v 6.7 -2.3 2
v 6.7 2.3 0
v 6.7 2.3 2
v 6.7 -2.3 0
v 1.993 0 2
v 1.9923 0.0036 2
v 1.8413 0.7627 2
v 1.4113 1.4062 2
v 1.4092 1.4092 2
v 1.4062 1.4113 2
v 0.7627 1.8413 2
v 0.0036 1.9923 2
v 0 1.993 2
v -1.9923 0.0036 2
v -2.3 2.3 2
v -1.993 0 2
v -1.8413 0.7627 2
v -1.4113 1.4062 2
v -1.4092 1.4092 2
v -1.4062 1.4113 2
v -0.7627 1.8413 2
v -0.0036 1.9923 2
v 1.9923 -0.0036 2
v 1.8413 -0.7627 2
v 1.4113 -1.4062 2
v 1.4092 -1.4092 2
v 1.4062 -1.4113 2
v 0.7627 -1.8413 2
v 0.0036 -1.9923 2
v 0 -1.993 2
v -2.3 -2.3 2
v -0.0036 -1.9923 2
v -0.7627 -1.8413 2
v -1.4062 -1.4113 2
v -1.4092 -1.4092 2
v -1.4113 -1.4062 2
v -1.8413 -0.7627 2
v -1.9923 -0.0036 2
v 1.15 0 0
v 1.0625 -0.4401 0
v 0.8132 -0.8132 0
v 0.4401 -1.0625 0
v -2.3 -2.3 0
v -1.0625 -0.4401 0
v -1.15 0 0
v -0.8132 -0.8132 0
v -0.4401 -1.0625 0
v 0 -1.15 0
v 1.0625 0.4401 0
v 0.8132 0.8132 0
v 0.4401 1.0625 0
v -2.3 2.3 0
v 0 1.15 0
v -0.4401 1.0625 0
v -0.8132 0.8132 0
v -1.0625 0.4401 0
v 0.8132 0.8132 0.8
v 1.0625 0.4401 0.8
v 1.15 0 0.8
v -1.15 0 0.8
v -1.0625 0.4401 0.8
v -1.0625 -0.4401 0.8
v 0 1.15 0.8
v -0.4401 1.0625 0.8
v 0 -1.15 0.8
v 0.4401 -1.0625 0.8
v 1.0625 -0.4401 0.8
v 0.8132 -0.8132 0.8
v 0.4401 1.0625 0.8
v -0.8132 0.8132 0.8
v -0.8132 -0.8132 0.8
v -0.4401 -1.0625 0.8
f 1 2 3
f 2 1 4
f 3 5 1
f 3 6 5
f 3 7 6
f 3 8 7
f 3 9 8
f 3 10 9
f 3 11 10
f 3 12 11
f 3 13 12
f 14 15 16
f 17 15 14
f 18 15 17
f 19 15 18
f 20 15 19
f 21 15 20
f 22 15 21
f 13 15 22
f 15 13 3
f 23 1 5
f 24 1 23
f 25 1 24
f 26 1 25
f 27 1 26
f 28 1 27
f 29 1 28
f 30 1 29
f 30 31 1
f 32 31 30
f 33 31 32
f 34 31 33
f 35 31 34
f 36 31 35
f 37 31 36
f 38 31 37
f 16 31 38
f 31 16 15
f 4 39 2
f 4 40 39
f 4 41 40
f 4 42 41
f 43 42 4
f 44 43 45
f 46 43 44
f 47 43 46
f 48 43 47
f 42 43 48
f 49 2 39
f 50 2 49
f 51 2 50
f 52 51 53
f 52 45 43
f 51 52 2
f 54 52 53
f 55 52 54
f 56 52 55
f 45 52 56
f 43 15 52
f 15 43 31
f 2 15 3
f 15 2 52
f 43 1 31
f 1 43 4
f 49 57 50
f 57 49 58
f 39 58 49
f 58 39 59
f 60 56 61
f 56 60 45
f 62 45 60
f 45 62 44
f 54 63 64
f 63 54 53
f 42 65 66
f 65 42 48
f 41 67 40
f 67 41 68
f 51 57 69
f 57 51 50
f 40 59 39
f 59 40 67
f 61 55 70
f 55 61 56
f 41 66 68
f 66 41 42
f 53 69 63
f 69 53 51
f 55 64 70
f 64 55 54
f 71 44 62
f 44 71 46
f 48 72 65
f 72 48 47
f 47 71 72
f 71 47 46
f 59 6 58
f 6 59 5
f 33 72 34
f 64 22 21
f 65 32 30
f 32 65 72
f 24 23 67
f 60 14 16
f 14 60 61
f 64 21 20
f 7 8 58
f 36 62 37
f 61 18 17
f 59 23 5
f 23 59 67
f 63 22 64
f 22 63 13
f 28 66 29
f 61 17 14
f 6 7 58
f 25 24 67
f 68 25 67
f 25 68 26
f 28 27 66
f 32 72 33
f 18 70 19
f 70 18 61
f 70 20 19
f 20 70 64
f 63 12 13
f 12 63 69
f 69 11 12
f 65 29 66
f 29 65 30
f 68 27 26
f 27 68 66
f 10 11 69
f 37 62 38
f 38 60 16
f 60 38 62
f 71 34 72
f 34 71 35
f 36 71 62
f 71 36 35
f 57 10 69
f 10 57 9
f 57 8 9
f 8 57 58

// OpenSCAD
// file: params.scad
// params.scad: mechanical parameters of the printed housing of the portable unit and shared helper modules.
// DESIGN ONLY: not printed, not built. Positions, beam sizes and assumed component outlines are defined in
// layout_gen.scad; do not retype them here.
include <layout_gen.scad>

$fn  = 40;
fn_s = 16;                         // facets of screw holes
eps  = 0.01;

// ---- heights above the deck top (z = 0 of the "deck frame")
ped_h   = axis_h - cube / 2;       // cube pedestal
fence_h = 2.5;                     // corner fences above the pedestal (below the beams)
fence_arm = 2.5;                   // arm length of a corner fence
feat_h  = inner_h - 0.3;           // baffles and dump walls end 0.3 mm below the lid

// ---- board seats (panels, sensor boards, mirrors, shutter plate)
seat_bw   = 1.2;                   // back wall
seat_lip  = 1.2;                   // front and back lips at the two ends
seat_eng  = 1.5;                   // engagement of a lip over the end of a board
seat_scr  = 4.4;                   // extension of the screw end beyond the board
seat_hole_x = -0.6;                // screw hole behind the front face (keeps the clamp tab off the side wall)
seat_hole_y = 2.05;                // screw hole beyond the end of the board

// ---- lid and corners
corner_r  = 2.0;                   // outer corner radius (vertical edges)
lid_lip_t = 1.2;                   // locating lip of the lid, inside the walls
lid_lip_h = 0.8;
lid_lip_c = 0.2;                   // clearance between lip and wall
lid_pad   = 1.2;                   // pads of the lid on the screw bosses (countersinks)

// ---- clamps
tab_l = 9.0;  tab_t = 2.0;  tab_back = 2.3;   // clamp tab: length, thickness, hole to rear end
tab_w1 = 4.6; tab_w2 = 9.0;                    // narrow / wide tab
lc_w = 4.6;   lc_t = 3.0;                      // lens clamp: width, thickness (45 degree nose)
lc_nose = lens_post_off - 1.5;                 // hole to the lower edge of the nose

// ---- colors of the assembly (paper palette)
c_print = "#CFCECE";  c_dark = "#6F6F6F";  c_l1 = "#3775BA";  c_l2 = "#DAA87C";  c_beam = "#8BCF8B";
c_glass = "#B8C9E5";  c_ink = "#272727";

// ---- outline of the housing (rounded vertical edges), inset by i
module outline2d(i = 0) { offset(delta = -i) offset(r = corner_r) offset(delta = -corner_r) square([LX, WY]); }

// ---- beams in the deck frame: required envelopes (+ m on every diameter); up > 0 opens them to the top
module bdisc(x, y, d, hx) { translate([x, y, axis_h]) rotate(hx ? [0, 90, 0] : [90, 0, 0]) cylinder(d = d, h = 0.02, center = true); }
module beam_seg(b, m = 0, up = 0) {
  hx = abs(b[3] - b[0]) > abs(b[4] - b[1]);
  hull() for (u = [0, up]) translate([0, 0, u]) { bdisc(b[0], b[1], b[2] + m, hx); bdisc(b[3], b[4], b[5] + m, hx); }
}
// space behind the reflecting face of a fold mirror (a beam ends on the 45 degree face, not on a plane across it)
module mirror_cut() { for (s = SEATS) if (s[8] == 0) translate([s[0], s[1], 0]) rotate([0, 0, s[2]]) translate([-5, -8, -1]) cube([5, 16, 80]); }
module beams(m = 0, up = 0, kind = -1) {
  difference() { union() for (b = BEAMS) if (kind < 0 || b[6] == kind) beam_seg(b, m, up); mirror_cut(); }
}

// ---- insertion volumes of the components (deck frame): body + clearance g, open to the top
module cyl_pocket(d, len, top = true) {
  rotate([0, 90, 0]) cylinder(d = d, h = len, center = true);
  if (top) translate([-len / 2, -d / 2, 0]) cube([len, d, inner_h]);
}
module pockets(g = clr) {
  for (c = CUBES) translate([c[0] - cube / 2 - g, c[1] - cube / 2 - g, ped_h]) cube([cube + 2 * g, cube + 2 * g, inner_h]);
  for (s = SEATS) translate([s[0], s[1], 0]) rotate([0, 0, s[2]])
    translate([-s[4] - g, -s[3] / 2 - g, axis_h - s[5] / 2]) cube([s[4] + 2 * g, s[3] + 2 * g, inner_h]);
  for (l = LENSES) translate([l[0], l[1], axis_h]) cyl_pocket(l[2], l[3] + 2 * g);
  translate([las_x + las_l / 2, las_y, axis_h]) cyl_pocket(las_d, las_l + 2 * g);
  translate([las_x + las_l + las_pin_l / 2, las_y, axis_h]) cyl_pocket(las_pin_d + 0.6, las_pin_l + 2 * g);
}

// ---- space of the clamp tabs (deck frame): tab + g, open to the top; no chassis feature may stand in it
module tab_box(w, g) { translate([-tab_back - g, -w / 2 - g, 0]) cube([tab_l + 2 * g, w + 2 * g, inner_h]); }
module tab_zones(g = 0.2) {
  for (p = POSTS) translate([p[0], p[1], axis_h + p[3]]) rotate([0, 0, p[2]]) tab_box(p[4] == 2 ? tab_w2 : tab_w1, g);
  for (s = SEATS) if (s[6] != 0) translate([s[0], s[1], 0]) rotate([0, 0, s[2]])
    translate([seat_hole_x, sign(s[6]) * (s[3] / 2 + clr + seat_hole_y), axis_h + s[5] / 2])
      rotate([0, 0, -90 * sign(s[6])]) tab_box(abs(s[6]) == 2 ? tab_w2 : tab_w1, g);
}
// main file
// clamps.scad: the two small clamps of the portable unit. DESIGN ONLY: not printed, not built.
// Print orientation: clamp tab flat as modeled (countersink up); lens clamp as modeled here, i.e. upside down
// with its top face on the bed (the 45 degree nose then leans inwards, the countersink is a 35 degree cone).
include <params.scad>

// flat tab over the top of a cube, a board or the laser can: hole at the origin, tab along +x
module tab_clamp(w = tab_w1) {
  difference() {
    translate([-tab_back, -w / 2, 0]) cube([tab_l, w, tab_t]);
    translate([0, 0, -1]) cylinder(d = scr_clear, h = tab_t + 2, $fn = fn_s);
    translate([0, 0, tab_t - scr_head_h]) cylinder(d1 = scr_clear, d2 = scr_head_d + 0.2, h = scr_head_h + eps, $fn = fn_s);
  }
}

// lens clamp, upside down: hole at the origin, 45 degree nose towards +x; the nose touches the cell on its upper
// 45 degree line and presses it onto the land and against the fence
module lens_clamp() {
  difference() {
    translate([0, lc_w / 2, 0]) rotate([90, 0, 0]) linear_extrude(lc_w)
      polygon([[-post / 2, 0], [lc_nose + lc_t, 0], [lc_nose, lc_t], [-post / 2, lc_t]]);
    translate([0, 0, -1]) cylinder(d = scr_clear, h = lc_t + 2, $fn = fn_s);
    translate([0, 0, -eps]) cylinder(d1 = scr_head_d + 0.2, d2 = scr_clear, h = scr_head_h + eps, $fn = fn_s);
  }
}

tab_clamp();
